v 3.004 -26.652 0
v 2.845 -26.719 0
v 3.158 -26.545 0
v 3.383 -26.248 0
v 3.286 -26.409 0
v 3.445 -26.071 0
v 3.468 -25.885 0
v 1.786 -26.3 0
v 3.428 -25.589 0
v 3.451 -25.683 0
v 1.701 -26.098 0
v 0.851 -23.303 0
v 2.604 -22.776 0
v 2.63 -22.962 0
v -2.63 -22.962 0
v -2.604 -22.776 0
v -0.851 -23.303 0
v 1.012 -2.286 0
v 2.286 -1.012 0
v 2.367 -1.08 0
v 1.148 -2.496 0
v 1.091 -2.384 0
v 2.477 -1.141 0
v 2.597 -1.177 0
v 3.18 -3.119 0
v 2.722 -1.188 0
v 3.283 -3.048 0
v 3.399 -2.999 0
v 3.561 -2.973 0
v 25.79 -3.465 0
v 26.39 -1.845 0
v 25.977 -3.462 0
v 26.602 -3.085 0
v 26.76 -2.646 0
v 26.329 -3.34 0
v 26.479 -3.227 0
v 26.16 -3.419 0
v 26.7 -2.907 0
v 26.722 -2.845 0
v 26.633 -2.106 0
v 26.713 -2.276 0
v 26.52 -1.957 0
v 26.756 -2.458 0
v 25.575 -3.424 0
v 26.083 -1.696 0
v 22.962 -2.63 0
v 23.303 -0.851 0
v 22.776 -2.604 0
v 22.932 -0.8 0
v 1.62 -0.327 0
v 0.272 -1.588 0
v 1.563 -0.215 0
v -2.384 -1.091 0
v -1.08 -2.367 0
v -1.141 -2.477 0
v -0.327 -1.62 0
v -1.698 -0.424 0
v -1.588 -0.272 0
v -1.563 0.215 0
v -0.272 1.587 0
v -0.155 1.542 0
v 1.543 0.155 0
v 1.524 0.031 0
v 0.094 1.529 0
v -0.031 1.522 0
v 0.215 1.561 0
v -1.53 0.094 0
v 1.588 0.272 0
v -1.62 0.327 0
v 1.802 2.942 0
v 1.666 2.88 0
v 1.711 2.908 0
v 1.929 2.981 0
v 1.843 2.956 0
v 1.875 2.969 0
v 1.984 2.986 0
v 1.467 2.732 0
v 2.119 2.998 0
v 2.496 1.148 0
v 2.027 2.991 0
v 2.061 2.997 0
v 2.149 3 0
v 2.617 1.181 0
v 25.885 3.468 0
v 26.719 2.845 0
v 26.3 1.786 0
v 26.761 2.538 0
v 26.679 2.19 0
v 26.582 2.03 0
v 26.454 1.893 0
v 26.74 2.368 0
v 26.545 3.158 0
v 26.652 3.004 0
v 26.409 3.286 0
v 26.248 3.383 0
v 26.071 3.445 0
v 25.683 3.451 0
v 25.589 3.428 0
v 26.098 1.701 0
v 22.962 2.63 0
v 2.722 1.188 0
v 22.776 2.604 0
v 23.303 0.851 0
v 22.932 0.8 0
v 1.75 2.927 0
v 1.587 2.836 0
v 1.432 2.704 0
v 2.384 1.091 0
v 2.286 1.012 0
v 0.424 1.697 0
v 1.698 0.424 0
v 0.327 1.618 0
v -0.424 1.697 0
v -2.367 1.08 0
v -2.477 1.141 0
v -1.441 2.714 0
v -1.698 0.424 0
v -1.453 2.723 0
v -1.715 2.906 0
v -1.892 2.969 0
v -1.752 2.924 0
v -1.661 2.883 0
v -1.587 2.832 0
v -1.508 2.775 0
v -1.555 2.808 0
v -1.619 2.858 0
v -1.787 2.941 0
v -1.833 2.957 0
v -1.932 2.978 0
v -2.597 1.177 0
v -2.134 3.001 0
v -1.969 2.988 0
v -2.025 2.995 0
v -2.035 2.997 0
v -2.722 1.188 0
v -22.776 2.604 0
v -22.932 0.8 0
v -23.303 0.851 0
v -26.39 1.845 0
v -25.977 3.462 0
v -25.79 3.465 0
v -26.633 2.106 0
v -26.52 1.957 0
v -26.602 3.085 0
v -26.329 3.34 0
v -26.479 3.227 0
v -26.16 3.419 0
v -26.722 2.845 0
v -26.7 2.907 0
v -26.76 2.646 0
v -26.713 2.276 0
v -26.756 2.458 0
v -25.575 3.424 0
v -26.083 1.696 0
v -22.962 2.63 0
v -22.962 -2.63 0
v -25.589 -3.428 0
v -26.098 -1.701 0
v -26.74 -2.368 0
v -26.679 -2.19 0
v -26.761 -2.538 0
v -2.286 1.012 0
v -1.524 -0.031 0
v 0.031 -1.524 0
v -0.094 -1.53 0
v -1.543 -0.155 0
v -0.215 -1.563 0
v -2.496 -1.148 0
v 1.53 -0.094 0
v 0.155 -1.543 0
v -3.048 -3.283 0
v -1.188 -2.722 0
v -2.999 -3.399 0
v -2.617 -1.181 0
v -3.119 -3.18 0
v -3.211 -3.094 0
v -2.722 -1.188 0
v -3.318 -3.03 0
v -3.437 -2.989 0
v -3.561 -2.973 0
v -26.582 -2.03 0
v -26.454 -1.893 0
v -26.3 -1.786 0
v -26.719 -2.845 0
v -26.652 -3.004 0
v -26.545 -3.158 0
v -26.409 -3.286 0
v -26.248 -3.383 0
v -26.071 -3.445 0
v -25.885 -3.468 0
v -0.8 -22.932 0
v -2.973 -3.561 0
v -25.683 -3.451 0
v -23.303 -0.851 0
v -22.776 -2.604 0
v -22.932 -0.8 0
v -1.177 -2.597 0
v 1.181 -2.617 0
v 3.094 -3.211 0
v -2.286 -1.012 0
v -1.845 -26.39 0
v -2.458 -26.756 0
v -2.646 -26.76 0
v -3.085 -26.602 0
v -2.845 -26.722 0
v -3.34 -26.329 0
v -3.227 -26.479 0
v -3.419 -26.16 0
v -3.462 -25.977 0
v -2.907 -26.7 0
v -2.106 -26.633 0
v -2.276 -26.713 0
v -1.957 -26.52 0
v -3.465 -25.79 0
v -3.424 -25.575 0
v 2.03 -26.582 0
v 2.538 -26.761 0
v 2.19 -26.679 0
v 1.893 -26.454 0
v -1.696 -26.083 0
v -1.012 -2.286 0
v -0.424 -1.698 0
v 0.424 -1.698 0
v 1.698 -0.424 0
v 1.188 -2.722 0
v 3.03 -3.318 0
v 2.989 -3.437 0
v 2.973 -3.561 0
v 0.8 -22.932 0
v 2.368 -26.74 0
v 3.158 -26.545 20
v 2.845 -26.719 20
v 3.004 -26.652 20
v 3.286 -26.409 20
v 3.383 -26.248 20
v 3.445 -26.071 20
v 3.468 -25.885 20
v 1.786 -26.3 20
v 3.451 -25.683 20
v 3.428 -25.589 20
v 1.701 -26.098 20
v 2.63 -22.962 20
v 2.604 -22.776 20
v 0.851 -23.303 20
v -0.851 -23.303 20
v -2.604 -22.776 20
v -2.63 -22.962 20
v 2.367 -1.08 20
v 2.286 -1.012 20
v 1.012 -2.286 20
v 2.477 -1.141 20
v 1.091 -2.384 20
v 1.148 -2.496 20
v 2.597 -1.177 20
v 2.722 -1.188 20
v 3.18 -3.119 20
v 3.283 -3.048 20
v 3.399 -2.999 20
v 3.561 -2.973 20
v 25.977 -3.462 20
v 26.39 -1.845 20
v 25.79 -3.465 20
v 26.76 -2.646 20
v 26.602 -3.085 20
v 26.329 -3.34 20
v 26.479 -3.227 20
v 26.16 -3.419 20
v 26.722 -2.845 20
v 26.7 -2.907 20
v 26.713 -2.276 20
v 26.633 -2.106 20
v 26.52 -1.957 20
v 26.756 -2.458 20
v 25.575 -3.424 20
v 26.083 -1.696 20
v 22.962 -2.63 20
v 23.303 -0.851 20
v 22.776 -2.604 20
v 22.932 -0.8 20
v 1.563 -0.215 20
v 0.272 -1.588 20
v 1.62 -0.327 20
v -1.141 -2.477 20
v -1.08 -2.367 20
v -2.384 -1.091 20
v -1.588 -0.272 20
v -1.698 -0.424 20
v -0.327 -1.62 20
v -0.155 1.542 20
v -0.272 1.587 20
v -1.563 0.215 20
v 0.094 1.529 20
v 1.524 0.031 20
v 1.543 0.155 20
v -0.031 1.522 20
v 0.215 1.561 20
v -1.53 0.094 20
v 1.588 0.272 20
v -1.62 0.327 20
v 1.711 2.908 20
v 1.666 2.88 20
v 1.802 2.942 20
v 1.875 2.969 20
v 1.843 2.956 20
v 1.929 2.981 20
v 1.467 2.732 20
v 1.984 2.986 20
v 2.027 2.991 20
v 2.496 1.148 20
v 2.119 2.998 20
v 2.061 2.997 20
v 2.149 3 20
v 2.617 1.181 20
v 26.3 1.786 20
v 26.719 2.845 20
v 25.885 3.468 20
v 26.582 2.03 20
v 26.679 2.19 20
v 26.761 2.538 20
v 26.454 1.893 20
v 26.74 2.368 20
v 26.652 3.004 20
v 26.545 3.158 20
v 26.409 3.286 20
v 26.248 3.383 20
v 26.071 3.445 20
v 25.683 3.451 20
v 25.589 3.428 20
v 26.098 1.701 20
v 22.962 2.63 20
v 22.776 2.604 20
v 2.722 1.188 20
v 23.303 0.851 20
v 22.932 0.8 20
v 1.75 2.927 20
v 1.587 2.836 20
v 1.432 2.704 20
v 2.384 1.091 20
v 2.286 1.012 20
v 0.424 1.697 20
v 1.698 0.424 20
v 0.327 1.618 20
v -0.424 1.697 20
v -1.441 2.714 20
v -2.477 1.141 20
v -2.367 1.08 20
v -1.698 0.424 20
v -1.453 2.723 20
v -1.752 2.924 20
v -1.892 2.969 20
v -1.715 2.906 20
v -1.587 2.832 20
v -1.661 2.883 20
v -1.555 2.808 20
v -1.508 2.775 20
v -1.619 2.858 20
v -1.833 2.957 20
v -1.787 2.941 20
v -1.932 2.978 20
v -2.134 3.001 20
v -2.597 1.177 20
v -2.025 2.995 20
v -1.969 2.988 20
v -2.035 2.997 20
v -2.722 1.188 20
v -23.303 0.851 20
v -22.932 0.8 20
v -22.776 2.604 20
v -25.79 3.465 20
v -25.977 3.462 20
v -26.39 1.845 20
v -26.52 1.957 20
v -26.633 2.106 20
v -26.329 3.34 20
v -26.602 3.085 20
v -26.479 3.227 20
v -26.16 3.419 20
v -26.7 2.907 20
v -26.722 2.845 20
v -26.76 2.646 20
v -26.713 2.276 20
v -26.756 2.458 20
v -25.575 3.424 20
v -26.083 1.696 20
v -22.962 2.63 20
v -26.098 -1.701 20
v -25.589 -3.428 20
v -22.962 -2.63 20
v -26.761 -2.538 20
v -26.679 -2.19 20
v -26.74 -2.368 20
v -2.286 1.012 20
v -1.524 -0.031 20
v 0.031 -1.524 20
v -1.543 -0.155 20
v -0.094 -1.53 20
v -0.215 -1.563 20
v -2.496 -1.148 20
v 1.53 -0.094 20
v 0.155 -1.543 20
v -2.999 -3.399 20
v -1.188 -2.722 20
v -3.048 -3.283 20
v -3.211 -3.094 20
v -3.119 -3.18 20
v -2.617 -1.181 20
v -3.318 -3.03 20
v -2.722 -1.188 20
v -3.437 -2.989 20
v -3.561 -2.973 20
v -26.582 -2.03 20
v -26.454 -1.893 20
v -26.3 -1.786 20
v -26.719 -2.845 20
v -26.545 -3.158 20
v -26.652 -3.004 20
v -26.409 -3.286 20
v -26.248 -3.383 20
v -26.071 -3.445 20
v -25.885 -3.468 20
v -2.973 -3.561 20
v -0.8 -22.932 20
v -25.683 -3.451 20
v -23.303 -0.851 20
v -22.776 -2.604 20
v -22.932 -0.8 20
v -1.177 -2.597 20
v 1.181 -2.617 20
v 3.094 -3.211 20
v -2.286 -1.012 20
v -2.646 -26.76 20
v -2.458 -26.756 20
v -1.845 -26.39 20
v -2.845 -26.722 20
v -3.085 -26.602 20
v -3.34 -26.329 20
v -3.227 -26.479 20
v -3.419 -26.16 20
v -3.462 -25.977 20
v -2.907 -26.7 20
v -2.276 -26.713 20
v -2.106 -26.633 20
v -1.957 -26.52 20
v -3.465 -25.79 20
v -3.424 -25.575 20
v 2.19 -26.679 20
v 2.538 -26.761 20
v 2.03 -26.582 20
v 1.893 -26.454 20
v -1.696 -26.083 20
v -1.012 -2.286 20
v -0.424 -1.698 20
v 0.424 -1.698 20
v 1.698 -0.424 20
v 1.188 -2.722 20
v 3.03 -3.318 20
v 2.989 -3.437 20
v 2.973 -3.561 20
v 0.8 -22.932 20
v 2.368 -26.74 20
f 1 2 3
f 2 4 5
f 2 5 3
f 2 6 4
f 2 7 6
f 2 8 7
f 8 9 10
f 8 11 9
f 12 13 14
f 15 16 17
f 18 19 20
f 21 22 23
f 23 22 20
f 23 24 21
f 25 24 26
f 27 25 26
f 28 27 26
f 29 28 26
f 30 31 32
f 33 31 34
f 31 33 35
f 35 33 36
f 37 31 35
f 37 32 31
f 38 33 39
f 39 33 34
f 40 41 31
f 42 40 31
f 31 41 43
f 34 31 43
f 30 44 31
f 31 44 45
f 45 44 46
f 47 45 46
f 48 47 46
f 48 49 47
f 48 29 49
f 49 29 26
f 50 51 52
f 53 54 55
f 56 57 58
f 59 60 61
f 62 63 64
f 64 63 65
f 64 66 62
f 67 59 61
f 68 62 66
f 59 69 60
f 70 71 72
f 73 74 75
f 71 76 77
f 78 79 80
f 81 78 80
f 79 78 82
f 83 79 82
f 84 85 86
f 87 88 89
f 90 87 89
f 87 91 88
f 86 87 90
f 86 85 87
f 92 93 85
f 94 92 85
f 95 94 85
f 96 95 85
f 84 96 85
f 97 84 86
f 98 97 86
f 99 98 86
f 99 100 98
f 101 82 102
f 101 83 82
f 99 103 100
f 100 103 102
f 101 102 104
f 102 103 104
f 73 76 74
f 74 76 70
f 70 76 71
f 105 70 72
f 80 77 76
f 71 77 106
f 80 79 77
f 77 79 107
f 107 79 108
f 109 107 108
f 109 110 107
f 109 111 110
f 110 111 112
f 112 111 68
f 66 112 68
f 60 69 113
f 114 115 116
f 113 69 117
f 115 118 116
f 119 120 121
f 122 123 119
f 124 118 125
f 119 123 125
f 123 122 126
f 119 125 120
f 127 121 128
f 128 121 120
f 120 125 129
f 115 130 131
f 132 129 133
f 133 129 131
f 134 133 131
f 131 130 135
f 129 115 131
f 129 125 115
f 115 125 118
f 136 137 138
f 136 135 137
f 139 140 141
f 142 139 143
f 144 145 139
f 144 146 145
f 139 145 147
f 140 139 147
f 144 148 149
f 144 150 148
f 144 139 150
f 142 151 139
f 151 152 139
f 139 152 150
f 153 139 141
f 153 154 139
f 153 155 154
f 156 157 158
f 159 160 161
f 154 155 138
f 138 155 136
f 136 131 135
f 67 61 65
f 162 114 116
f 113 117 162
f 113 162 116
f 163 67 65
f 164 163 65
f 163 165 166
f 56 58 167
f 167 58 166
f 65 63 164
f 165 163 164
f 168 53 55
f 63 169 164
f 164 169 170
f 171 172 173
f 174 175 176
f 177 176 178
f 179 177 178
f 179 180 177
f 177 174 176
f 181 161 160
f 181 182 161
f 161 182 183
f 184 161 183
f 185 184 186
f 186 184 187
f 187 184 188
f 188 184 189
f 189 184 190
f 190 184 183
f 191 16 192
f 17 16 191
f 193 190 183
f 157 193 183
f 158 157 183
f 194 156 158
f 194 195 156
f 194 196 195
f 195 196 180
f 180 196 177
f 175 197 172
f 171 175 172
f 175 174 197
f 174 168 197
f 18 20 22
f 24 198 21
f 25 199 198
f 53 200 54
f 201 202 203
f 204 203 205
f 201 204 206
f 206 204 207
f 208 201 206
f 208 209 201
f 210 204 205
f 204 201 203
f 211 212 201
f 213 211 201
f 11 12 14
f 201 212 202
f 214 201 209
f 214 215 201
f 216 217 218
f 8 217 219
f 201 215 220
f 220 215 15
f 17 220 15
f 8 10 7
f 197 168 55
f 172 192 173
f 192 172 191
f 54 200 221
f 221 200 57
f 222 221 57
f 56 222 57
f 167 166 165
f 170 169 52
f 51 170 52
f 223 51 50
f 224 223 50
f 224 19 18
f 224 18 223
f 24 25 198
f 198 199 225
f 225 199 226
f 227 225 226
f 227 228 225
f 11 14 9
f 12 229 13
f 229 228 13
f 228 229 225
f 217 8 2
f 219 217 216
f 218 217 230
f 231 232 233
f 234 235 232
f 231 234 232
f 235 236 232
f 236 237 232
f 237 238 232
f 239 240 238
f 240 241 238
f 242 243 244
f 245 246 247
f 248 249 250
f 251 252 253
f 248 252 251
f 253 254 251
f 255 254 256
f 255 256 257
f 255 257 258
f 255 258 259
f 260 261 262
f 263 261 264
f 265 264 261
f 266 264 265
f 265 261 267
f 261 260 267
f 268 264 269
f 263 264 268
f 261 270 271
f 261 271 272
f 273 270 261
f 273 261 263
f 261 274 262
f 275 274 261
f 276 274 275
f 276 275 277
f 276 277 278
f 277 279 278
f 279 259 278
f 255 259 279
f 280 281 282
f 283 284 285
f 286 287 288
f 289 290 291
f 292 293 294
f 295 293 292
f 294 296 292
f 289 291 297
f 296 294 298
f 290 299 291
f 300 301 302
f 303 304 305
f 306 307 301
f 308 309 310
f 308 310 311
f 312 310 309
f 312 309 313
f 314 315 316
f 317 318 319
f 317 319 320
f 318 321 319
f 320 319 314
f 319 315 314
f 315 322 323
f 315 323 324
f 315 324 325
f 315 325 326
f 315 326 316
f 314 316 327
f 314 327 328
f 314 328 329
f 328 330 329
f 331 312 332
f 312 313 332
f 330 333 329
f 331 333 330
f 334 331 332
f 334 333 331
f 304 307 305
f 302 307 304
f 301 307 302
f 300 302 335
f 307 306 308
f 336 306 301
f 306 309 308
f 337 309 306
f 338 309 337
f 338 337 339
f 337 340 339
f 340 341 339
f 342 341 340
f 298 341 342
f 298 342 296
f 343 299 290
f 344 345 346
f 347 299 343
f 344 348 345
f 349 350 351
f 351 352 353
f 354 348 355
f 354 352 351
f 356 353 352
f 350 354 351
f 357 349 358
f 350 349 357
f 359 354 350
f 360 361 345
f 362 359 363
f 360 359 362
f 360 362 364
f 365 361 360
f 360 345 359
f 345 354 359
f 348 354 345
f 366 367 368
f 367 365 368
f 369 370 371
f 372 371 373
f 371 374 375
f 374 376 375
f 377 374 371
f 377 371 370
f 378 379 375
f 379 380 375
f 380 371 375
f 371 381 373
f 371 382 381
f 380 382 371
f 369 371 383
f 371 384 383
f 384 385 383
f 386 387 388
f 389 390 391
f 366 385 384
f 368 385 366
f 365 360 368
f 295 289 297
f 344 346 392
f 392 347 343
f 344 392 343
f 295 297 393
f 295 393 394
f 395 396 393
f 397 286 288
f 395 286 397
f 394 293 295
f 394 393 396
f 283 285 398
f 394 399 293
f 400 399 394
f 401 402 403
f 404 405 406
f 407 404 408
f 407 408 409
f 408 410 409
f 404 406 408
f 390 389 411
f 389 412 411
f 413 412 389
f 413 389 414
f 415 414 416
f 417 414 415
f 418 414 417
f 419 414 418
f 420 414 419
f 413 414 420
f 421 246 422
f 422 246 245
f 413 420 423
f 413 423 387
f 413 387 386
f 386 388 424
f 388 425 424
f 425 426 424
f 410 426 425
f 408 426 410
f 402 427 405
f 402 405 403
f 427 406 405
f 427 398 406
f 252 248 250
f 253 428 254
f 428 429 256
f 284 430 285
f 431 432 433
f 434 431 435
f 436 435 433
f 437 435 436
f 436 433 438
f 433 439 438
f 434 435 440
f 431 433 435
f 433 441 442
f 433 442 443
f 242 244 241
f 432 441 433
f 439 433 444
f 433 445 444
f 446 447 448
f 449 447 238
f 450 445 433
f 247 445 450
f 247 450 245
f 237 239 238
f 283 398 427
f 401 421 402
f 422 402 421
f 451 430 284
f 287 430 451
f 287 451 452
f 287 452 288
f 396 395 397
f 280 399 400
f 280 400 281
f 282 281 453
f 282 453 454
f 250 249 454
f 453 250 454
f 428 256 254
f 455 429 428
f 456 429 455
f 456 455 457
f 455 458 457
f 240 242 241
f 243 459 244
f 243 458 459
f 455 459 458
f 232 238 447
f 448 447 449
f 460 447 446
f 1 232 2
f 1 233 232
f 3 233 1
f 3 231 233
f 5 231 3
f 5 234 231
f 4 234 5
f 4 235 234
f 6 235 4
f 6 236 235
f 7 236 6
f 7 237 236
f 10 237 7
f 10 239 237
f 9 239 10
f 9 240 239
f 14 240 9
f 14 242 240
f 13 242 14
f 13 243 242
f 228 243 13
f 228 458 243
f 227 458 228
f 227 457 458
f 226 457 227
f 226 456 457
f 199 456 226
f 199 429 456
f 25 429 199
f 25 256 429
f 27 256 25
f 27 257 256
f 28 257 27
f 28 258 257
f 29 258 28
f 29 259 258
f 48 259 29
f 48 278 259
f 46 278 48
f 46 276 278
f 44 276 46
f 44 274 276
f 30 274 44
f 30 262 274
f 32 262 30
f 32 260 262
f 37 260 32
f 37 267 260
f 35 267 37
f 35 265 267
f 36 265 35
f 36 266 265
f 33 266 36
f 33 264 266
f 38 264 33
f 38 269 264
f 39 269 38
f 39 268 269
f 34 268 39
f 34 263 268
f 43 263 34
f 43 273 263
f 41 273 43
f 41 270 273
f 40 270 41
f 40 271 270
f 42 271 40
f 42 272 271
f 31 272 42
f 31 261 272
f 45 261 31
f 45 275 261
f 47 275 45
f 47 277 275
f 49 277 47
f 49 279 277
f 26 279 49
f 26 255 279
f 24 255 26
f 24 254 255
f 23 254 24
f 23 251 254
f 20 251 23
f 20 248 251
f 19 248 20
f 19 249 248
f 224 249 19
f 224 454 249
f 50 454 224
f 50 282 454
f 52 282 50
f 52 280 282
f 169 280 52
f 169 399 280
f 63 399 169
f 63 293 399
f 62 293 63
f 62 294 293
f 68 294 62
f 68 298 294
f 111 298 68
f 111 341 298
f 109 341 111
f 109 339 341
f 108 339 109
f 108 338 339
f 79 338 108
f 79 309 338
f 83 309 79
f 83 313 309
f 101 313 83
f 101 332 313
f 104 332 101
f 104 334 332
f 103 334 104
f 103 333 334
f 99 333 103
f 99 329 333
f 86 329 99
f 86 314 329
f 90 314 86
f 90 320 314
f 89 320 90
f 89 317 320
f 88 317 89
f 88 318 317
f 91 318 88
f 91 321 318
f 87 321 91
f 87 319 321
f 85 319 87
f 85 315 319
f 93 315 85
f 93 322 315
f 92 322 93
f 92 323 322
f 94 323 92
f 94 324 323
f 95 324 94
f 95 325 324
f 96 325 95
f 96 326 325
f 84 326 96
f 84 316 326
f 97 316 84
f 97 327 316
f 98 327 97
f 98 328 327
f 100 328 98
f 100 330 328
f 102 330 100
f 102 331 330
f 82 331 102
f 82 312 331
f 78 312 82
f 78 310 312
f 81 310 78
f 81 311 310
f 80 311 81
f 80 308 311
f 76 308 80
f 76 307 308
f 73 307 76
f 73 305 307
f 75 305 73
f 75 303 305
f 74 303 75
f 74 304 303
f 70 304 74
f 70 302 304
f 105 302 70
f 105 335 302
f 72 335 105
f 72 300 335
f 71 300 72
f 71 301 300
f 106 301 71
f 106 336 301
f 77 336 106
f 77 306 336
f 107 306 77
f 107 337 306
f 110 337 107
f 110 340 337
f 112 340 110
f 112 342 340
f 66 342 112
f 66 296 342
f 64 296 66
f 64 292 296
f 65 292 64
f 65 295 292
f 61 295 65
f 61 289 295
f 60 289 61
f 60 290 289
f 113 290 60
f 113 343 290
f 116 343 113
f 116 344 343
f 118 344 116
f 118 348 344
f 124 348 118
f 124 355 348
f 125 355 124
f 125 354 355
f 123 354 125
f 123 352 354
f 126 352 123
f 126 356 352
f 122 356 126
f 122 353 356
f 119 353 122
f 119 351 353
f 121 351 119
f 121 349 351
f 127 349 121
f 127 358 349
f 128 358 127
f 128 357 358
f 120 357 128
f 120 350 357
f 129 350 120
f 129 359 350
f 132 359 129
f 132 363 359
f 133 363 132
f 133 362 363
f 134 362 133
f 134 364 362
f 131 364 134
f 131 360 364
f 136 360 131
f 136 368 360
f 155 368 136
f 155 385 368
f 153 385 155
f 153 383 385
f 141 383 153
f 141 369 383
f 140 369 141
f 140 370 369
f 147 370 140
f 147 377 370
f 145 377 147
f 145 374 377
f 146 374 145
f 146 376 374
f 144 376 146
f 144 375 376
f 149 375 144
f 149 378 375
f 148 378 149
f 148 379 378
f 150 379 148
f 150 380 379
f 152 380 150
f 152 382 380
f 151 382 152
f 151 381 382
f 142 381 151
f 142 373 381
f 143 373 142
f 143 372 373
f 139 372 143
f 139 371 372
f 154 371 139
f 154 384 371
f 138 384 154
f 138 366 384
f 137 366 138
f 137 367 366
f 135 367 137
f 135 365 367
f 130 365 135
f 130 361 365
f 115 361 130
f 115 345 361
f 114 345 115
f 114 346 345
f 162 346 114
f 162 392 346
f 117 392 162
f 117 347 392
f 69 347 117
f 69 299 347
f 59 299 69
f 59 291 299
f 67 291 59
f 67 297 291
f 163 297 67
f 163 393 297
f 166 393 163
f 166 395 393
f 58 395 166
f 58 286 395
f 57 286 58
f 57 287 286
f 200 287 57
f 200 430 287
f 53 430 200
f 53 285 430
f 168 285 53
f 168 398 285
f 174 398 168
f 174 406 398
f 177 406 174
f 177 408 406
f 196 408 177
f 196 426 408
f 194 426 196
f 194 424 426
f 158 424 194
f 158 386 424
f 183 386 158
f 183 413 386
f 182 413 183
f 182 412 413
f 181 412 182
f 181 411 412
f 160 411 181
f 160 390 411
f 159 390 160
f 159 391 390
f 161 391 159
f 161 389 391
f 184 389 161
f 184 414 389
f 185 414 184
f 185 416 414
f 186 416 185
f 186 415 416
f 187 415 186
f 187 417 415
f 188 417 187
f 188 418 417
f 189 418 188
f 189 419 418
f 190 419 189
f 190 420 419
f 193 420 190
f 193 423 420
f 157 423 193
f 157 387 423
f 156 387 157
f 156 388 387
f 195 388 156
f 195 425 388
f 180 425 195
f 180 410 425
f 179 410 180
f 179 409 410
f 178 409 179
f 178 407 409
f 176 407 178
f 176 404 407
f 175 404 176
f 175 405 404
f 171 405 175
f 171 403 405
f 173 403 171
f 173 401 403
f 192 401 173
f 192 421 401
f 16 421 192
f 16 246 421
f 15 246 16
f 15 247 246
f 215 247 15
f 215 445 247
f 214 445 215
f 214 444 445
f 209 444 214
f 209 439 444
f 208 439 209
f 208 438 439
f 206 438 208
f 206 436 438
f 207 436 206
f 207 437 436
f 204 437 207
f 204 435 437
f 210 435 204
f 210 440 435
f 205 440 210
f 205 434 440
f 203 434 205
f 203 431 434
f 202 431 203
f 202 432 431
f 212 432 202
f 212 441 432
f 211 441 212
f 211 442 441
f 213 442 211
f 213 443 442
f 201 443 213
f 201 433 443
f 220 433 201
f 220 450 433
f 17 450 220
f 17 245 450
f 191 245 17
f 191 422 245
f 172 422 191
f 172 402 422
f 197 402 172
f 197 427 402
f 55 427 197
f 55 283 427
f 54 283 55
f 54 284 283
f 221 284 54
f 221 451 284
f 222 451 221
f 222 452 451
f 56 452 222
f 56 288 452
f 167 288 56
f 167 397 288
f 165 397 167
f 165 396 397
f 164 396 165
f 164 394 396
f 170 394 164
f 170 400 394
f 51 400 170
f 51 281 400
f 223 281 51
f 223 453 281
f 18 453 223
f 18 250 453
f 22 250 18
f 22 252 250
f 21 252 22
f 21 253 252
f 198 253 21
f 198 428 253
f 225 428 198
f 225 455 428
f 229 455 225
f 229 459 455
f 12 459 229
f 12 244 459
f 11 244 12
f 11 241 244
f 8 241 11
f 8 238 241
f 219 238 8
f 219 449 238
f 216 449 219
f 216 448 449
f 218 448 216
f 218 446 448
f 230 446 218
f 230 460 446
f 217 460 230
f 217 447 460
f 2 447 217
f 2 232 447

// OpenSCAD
length = 23;
gap_inner = 2.4;
pinch_angle = 1.1;
gauge = 1.8;

flare_length = 3;
flare_angle = 18;

eps = 0.001;

module leg_2d() {
  spread = gap_inner/2 + gauge/2;
  
  rotate([0, 0, 45])
    square([spread*sqrt(2), eps]);
  translate([spread, spread]) {
    rotate([0, 0, pinch_angle]) {
      square([eps, length - spread]);
      translate([0, length - spread])
        rotate([0, 0, -flare_angle])
          square([eps, flare_length]);
    }
  }
}

module piece_2d(n=3) {
  $fn = 30;
  roundoff = 0.6;
  
  offset(-roundoff)
    offset(gauge/2 + roundoff)
      for (a = [1:n])
        rotate([0, 0, a*90])
          for (b = [-1, 1])
            scale([b, 1])
              leg_2d();
}

linear_extrude(20)
piece_2d(3);
